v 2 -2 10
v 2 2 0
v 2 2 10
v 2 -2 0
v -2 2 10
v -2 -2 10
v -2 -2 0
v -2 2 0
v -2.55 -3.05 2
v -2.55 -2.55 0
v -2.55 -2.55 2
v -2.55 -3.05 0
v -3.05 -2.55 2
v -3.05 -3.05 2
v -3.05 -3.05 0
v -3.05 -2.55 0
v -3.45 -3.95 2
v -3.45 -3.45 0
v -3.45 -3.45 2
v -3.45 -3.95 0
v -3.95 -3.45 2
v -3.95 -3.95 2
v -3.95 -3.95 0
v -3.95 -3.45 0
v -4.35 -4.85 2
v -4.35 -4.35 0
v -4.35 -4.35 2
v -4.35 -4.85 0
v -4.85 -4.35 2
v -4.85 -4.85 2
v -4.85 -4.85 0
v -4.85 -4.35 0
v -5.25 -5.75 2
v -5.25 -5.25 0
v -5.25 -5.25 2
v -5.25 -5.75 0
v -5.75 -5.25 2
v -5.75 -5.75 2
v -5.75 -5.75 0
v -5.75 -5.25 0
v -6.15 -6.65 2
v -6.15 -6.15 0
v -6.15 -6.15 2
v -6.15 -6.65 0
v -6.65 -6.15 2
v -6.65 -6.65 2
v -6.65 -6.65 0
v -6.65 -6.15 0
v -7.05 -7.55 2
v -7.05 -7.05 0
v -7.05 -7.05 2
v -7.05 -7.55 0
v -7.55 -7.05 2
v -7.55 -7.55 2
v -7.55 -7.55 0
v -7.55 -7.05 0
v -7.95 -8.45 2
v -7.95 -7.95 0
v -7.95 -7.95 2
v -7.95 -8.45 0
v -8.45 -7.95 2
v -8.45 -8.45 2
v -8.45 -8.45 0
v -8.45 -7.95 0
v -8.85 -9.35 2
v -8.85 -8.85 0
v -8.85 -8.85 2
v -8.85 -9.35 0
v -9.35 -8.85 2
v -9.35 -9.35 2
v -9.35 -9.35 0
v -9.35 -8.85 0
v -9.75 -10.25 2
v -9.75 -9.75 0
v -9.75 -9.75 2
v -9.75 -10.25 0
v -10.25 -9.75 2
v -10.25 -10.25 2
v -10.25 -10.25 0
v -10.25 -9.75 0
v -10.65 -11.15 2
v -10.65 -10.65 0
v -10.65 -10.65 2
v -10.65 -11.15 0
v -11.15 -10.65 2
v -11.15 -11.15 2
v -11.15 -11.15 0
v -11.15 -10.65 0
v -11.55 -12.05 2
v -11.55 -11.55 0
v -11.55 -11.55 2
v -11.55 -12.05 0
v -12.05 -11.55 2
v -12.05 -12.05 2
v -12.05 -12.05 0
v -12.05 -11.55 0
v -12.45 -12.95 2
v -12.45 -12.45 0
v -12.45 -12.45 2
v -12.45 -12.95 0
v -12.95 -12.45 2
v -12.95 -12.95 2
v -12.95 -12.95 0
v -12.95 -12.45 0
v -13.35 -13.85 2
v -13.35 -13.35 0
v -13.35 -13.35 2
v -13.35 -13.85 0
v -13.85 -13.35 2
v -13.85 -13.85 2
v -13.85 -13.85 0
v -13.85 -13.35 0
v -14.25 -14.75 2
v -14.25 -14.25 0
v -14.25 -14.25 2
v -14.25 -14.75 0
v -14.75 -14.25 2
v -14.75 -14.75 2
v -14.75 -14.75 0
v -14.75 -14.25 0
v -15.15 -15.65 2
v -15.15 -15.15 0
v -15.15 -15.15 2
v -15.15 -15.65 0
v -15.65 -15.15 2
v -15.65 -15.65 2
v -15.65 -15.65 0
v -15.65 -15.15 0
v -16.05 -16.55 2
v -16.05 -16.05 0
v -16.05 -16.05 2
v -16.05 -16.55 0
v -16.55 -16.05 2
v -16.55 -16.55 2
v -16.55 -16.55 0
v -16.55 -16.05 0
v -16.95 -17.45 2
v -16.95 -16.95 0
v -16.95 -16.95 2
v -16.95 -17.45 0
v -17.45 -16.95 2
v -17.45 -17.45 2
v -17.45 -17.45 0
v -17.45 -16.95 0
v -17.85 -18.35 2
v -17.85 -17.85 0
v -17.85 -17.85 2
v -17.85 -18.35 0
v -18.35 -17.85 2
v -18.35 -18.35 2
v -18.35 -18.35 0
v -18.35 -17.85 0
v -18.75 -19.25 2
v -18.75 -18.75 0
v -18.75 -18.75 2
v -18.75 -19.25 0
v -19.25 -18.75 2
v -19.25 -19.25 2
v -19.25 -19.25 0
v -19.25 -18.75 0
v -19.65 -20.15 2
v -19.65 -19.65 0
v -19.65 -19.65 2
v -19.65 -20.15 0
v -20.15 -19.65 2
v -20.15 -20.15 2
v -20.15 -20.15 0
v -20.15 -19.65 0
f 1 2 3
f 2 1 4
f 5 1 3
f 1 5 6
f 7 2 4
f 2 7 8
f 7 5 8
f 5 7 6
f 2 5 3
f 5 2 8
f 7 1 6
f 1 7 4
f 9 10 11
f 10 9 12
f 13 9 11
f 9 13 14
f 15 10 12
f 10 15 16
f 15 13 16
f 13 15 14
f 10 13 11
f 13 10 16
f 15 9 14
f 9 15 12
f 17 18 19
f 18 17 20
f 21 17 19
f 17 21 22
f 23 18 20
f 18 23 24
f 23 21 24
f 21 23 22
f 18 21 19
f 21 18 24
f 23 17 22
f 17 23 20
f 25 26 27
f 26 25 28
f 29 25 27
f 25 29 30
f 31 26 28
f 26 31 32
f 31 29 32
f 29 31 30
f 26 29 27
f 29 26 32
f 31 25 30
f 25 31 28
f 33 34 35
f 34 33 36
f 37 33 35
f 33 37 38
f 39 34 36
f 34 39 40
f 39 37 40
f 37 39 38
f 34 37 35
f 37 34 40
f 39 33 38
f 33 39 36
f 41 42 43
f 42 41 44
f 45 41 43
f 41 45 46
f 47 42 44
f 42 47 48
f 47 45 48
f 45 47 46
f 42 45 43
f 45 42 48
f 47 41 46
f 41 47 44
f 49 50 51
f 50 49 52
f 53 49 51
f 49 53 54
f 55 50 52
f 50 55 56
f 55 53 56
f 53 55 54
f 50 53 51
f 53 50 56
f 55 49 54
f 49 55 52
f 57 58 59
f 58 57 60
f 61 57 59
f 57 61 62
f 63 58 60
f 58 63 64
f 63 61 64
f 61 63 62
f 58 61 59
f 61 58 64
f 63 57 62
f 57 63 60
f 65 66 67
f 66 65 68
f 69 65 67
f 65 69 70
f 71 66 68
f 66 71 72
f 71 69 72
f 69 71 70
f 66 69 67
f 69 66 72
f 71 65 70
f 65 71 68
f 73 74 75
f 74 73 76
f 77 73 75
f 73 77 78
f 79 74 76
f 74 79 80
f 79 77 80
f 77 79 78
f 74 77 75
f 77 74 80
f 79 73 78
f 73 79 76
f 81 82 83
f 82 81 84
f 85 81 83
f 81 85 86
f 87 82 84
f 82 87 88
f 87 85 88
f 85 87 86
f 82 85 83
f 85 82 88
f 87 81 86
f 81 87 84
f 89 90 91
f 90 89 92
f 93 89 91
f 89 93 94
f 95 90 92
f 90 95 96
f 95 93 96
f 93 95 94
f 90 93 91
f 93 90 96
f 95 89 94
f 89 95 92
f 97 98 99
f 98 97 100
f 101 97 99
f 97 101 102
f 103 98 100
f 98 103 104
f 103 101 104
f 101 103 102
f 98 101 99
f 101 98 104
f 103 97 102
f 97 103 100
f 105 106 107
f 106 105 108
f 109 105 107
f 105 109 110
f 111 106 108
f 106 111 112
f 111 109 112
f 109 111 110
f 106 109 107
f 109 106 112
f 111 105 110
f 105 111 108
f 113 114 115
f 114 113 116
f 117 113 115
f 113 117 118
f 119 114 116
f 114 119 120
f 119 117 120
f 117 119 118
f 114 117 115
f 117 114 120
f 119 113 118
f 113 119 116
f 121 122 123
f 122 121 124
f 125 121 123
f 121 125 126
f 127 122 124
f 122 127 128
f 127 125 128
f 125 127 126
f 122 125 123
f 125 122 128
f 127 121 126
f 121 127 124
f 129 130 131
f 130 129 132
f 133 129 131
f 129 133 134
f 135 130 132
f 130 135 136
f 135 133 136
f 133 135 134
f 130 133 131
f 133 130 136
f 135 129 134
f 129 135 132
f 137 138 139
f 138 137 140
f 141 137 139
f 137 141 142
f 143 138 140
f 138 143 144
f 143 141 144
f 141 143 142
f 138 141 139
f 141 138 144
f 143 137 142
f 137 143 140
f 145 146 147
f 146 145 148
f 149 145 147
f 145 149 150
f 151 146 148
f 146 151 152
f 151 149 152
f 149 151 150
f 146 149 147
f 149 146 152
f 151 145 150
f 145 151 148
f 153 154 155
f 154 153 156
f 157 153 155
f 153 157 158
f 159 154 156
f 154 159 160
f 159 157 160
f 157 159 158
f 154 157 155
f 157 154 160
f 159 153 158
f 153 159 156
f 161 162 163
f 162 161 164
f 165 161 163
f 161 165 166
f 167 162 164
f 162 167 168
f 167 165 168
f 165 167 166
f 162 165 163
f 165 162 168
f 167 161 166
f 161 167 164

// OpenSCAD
translate([0, 0, 5]) color([0,1,0,0.9]) cube([4, 4, 10], center=true);
translate([-2.8, -2.8, 1]) color([1,0,0]) cube([0.5, 0.5, 2], center=true);
translate([-3.7, -3.7, 1]) color([1,0,0]) cube([0.5, 0.5, 2], center=true);
translate([-4.6, -4.6, 1]) color([1,0,0]) cube([0.5, 0.5, 2], center=true);
translate([-5.5, -5.5, 1]) color([1,0,0]) cube([0.5, 0.5, 2], center=true);
translate([-6.4, -6.4, 1]) color([1,0,0]) cube([0.5, 0.5, 2], center=true);
translate([-7.3, -7.3, 1]) color([1,0,0]) cube([0.5, 0.5, 2], center=true);
translate([-8.2, -8.2, 1]) color([1,0,0]) cube([0.5, 0.5, 2], center=true);
translate([-9.1, -9.1, 1]) color([1,0,0]) cube([0.5, 0.5, 2], center=true);
translate([-10.0, -10.0, 1]) color([1,0,0]) cube([0.5, 0.5, 2], center=true);
translate([-10.9, -10.9, 1]) color([1,0,0]) cube([0.5, 0.5, 2], center=true);
translate([-11.8, -11.8, 1]) color([1,0,0]) cube([0.5, 0.5, 2], center=true);
translate([-12.7, -12.7, 1]) color([1,0,0]) cube([0.5, 0.5, 2], center=true);
translate([-13.6, -13.6, 1]) color([1,0,0]) cube([0.5, 0.5, 2], center=true);
translate([-14.5, -14.5, 1]) color([1,0,0]) cube([0.5, 0.5, 2], center=true);
translate([-15.4, -15.4, 1]) color([1,0,0]) cube([0.5, 0.5, 2], center=true);
translate([-16.3, -16.3, 1]) color([1,0,0]) cube([0.5, 0.5, 2], center=true);
translate([-17.2, -17.2, 1]) color([1,0,0]) cube([0.5, 0.5, 2], center=true);
translate([-18.1, -18.1, 1]) color([1,0,0]) cube([0.5, 0.5, 2], center=true);
translate([-19.0, -19.0, 1]) color([1,0,0]) cube([0.5, 0.5, 2], center=true);
translate([-19.9, -19.9, 1]) color([1,0,0]) cube([0.5, 0.5, 2], center=true);
